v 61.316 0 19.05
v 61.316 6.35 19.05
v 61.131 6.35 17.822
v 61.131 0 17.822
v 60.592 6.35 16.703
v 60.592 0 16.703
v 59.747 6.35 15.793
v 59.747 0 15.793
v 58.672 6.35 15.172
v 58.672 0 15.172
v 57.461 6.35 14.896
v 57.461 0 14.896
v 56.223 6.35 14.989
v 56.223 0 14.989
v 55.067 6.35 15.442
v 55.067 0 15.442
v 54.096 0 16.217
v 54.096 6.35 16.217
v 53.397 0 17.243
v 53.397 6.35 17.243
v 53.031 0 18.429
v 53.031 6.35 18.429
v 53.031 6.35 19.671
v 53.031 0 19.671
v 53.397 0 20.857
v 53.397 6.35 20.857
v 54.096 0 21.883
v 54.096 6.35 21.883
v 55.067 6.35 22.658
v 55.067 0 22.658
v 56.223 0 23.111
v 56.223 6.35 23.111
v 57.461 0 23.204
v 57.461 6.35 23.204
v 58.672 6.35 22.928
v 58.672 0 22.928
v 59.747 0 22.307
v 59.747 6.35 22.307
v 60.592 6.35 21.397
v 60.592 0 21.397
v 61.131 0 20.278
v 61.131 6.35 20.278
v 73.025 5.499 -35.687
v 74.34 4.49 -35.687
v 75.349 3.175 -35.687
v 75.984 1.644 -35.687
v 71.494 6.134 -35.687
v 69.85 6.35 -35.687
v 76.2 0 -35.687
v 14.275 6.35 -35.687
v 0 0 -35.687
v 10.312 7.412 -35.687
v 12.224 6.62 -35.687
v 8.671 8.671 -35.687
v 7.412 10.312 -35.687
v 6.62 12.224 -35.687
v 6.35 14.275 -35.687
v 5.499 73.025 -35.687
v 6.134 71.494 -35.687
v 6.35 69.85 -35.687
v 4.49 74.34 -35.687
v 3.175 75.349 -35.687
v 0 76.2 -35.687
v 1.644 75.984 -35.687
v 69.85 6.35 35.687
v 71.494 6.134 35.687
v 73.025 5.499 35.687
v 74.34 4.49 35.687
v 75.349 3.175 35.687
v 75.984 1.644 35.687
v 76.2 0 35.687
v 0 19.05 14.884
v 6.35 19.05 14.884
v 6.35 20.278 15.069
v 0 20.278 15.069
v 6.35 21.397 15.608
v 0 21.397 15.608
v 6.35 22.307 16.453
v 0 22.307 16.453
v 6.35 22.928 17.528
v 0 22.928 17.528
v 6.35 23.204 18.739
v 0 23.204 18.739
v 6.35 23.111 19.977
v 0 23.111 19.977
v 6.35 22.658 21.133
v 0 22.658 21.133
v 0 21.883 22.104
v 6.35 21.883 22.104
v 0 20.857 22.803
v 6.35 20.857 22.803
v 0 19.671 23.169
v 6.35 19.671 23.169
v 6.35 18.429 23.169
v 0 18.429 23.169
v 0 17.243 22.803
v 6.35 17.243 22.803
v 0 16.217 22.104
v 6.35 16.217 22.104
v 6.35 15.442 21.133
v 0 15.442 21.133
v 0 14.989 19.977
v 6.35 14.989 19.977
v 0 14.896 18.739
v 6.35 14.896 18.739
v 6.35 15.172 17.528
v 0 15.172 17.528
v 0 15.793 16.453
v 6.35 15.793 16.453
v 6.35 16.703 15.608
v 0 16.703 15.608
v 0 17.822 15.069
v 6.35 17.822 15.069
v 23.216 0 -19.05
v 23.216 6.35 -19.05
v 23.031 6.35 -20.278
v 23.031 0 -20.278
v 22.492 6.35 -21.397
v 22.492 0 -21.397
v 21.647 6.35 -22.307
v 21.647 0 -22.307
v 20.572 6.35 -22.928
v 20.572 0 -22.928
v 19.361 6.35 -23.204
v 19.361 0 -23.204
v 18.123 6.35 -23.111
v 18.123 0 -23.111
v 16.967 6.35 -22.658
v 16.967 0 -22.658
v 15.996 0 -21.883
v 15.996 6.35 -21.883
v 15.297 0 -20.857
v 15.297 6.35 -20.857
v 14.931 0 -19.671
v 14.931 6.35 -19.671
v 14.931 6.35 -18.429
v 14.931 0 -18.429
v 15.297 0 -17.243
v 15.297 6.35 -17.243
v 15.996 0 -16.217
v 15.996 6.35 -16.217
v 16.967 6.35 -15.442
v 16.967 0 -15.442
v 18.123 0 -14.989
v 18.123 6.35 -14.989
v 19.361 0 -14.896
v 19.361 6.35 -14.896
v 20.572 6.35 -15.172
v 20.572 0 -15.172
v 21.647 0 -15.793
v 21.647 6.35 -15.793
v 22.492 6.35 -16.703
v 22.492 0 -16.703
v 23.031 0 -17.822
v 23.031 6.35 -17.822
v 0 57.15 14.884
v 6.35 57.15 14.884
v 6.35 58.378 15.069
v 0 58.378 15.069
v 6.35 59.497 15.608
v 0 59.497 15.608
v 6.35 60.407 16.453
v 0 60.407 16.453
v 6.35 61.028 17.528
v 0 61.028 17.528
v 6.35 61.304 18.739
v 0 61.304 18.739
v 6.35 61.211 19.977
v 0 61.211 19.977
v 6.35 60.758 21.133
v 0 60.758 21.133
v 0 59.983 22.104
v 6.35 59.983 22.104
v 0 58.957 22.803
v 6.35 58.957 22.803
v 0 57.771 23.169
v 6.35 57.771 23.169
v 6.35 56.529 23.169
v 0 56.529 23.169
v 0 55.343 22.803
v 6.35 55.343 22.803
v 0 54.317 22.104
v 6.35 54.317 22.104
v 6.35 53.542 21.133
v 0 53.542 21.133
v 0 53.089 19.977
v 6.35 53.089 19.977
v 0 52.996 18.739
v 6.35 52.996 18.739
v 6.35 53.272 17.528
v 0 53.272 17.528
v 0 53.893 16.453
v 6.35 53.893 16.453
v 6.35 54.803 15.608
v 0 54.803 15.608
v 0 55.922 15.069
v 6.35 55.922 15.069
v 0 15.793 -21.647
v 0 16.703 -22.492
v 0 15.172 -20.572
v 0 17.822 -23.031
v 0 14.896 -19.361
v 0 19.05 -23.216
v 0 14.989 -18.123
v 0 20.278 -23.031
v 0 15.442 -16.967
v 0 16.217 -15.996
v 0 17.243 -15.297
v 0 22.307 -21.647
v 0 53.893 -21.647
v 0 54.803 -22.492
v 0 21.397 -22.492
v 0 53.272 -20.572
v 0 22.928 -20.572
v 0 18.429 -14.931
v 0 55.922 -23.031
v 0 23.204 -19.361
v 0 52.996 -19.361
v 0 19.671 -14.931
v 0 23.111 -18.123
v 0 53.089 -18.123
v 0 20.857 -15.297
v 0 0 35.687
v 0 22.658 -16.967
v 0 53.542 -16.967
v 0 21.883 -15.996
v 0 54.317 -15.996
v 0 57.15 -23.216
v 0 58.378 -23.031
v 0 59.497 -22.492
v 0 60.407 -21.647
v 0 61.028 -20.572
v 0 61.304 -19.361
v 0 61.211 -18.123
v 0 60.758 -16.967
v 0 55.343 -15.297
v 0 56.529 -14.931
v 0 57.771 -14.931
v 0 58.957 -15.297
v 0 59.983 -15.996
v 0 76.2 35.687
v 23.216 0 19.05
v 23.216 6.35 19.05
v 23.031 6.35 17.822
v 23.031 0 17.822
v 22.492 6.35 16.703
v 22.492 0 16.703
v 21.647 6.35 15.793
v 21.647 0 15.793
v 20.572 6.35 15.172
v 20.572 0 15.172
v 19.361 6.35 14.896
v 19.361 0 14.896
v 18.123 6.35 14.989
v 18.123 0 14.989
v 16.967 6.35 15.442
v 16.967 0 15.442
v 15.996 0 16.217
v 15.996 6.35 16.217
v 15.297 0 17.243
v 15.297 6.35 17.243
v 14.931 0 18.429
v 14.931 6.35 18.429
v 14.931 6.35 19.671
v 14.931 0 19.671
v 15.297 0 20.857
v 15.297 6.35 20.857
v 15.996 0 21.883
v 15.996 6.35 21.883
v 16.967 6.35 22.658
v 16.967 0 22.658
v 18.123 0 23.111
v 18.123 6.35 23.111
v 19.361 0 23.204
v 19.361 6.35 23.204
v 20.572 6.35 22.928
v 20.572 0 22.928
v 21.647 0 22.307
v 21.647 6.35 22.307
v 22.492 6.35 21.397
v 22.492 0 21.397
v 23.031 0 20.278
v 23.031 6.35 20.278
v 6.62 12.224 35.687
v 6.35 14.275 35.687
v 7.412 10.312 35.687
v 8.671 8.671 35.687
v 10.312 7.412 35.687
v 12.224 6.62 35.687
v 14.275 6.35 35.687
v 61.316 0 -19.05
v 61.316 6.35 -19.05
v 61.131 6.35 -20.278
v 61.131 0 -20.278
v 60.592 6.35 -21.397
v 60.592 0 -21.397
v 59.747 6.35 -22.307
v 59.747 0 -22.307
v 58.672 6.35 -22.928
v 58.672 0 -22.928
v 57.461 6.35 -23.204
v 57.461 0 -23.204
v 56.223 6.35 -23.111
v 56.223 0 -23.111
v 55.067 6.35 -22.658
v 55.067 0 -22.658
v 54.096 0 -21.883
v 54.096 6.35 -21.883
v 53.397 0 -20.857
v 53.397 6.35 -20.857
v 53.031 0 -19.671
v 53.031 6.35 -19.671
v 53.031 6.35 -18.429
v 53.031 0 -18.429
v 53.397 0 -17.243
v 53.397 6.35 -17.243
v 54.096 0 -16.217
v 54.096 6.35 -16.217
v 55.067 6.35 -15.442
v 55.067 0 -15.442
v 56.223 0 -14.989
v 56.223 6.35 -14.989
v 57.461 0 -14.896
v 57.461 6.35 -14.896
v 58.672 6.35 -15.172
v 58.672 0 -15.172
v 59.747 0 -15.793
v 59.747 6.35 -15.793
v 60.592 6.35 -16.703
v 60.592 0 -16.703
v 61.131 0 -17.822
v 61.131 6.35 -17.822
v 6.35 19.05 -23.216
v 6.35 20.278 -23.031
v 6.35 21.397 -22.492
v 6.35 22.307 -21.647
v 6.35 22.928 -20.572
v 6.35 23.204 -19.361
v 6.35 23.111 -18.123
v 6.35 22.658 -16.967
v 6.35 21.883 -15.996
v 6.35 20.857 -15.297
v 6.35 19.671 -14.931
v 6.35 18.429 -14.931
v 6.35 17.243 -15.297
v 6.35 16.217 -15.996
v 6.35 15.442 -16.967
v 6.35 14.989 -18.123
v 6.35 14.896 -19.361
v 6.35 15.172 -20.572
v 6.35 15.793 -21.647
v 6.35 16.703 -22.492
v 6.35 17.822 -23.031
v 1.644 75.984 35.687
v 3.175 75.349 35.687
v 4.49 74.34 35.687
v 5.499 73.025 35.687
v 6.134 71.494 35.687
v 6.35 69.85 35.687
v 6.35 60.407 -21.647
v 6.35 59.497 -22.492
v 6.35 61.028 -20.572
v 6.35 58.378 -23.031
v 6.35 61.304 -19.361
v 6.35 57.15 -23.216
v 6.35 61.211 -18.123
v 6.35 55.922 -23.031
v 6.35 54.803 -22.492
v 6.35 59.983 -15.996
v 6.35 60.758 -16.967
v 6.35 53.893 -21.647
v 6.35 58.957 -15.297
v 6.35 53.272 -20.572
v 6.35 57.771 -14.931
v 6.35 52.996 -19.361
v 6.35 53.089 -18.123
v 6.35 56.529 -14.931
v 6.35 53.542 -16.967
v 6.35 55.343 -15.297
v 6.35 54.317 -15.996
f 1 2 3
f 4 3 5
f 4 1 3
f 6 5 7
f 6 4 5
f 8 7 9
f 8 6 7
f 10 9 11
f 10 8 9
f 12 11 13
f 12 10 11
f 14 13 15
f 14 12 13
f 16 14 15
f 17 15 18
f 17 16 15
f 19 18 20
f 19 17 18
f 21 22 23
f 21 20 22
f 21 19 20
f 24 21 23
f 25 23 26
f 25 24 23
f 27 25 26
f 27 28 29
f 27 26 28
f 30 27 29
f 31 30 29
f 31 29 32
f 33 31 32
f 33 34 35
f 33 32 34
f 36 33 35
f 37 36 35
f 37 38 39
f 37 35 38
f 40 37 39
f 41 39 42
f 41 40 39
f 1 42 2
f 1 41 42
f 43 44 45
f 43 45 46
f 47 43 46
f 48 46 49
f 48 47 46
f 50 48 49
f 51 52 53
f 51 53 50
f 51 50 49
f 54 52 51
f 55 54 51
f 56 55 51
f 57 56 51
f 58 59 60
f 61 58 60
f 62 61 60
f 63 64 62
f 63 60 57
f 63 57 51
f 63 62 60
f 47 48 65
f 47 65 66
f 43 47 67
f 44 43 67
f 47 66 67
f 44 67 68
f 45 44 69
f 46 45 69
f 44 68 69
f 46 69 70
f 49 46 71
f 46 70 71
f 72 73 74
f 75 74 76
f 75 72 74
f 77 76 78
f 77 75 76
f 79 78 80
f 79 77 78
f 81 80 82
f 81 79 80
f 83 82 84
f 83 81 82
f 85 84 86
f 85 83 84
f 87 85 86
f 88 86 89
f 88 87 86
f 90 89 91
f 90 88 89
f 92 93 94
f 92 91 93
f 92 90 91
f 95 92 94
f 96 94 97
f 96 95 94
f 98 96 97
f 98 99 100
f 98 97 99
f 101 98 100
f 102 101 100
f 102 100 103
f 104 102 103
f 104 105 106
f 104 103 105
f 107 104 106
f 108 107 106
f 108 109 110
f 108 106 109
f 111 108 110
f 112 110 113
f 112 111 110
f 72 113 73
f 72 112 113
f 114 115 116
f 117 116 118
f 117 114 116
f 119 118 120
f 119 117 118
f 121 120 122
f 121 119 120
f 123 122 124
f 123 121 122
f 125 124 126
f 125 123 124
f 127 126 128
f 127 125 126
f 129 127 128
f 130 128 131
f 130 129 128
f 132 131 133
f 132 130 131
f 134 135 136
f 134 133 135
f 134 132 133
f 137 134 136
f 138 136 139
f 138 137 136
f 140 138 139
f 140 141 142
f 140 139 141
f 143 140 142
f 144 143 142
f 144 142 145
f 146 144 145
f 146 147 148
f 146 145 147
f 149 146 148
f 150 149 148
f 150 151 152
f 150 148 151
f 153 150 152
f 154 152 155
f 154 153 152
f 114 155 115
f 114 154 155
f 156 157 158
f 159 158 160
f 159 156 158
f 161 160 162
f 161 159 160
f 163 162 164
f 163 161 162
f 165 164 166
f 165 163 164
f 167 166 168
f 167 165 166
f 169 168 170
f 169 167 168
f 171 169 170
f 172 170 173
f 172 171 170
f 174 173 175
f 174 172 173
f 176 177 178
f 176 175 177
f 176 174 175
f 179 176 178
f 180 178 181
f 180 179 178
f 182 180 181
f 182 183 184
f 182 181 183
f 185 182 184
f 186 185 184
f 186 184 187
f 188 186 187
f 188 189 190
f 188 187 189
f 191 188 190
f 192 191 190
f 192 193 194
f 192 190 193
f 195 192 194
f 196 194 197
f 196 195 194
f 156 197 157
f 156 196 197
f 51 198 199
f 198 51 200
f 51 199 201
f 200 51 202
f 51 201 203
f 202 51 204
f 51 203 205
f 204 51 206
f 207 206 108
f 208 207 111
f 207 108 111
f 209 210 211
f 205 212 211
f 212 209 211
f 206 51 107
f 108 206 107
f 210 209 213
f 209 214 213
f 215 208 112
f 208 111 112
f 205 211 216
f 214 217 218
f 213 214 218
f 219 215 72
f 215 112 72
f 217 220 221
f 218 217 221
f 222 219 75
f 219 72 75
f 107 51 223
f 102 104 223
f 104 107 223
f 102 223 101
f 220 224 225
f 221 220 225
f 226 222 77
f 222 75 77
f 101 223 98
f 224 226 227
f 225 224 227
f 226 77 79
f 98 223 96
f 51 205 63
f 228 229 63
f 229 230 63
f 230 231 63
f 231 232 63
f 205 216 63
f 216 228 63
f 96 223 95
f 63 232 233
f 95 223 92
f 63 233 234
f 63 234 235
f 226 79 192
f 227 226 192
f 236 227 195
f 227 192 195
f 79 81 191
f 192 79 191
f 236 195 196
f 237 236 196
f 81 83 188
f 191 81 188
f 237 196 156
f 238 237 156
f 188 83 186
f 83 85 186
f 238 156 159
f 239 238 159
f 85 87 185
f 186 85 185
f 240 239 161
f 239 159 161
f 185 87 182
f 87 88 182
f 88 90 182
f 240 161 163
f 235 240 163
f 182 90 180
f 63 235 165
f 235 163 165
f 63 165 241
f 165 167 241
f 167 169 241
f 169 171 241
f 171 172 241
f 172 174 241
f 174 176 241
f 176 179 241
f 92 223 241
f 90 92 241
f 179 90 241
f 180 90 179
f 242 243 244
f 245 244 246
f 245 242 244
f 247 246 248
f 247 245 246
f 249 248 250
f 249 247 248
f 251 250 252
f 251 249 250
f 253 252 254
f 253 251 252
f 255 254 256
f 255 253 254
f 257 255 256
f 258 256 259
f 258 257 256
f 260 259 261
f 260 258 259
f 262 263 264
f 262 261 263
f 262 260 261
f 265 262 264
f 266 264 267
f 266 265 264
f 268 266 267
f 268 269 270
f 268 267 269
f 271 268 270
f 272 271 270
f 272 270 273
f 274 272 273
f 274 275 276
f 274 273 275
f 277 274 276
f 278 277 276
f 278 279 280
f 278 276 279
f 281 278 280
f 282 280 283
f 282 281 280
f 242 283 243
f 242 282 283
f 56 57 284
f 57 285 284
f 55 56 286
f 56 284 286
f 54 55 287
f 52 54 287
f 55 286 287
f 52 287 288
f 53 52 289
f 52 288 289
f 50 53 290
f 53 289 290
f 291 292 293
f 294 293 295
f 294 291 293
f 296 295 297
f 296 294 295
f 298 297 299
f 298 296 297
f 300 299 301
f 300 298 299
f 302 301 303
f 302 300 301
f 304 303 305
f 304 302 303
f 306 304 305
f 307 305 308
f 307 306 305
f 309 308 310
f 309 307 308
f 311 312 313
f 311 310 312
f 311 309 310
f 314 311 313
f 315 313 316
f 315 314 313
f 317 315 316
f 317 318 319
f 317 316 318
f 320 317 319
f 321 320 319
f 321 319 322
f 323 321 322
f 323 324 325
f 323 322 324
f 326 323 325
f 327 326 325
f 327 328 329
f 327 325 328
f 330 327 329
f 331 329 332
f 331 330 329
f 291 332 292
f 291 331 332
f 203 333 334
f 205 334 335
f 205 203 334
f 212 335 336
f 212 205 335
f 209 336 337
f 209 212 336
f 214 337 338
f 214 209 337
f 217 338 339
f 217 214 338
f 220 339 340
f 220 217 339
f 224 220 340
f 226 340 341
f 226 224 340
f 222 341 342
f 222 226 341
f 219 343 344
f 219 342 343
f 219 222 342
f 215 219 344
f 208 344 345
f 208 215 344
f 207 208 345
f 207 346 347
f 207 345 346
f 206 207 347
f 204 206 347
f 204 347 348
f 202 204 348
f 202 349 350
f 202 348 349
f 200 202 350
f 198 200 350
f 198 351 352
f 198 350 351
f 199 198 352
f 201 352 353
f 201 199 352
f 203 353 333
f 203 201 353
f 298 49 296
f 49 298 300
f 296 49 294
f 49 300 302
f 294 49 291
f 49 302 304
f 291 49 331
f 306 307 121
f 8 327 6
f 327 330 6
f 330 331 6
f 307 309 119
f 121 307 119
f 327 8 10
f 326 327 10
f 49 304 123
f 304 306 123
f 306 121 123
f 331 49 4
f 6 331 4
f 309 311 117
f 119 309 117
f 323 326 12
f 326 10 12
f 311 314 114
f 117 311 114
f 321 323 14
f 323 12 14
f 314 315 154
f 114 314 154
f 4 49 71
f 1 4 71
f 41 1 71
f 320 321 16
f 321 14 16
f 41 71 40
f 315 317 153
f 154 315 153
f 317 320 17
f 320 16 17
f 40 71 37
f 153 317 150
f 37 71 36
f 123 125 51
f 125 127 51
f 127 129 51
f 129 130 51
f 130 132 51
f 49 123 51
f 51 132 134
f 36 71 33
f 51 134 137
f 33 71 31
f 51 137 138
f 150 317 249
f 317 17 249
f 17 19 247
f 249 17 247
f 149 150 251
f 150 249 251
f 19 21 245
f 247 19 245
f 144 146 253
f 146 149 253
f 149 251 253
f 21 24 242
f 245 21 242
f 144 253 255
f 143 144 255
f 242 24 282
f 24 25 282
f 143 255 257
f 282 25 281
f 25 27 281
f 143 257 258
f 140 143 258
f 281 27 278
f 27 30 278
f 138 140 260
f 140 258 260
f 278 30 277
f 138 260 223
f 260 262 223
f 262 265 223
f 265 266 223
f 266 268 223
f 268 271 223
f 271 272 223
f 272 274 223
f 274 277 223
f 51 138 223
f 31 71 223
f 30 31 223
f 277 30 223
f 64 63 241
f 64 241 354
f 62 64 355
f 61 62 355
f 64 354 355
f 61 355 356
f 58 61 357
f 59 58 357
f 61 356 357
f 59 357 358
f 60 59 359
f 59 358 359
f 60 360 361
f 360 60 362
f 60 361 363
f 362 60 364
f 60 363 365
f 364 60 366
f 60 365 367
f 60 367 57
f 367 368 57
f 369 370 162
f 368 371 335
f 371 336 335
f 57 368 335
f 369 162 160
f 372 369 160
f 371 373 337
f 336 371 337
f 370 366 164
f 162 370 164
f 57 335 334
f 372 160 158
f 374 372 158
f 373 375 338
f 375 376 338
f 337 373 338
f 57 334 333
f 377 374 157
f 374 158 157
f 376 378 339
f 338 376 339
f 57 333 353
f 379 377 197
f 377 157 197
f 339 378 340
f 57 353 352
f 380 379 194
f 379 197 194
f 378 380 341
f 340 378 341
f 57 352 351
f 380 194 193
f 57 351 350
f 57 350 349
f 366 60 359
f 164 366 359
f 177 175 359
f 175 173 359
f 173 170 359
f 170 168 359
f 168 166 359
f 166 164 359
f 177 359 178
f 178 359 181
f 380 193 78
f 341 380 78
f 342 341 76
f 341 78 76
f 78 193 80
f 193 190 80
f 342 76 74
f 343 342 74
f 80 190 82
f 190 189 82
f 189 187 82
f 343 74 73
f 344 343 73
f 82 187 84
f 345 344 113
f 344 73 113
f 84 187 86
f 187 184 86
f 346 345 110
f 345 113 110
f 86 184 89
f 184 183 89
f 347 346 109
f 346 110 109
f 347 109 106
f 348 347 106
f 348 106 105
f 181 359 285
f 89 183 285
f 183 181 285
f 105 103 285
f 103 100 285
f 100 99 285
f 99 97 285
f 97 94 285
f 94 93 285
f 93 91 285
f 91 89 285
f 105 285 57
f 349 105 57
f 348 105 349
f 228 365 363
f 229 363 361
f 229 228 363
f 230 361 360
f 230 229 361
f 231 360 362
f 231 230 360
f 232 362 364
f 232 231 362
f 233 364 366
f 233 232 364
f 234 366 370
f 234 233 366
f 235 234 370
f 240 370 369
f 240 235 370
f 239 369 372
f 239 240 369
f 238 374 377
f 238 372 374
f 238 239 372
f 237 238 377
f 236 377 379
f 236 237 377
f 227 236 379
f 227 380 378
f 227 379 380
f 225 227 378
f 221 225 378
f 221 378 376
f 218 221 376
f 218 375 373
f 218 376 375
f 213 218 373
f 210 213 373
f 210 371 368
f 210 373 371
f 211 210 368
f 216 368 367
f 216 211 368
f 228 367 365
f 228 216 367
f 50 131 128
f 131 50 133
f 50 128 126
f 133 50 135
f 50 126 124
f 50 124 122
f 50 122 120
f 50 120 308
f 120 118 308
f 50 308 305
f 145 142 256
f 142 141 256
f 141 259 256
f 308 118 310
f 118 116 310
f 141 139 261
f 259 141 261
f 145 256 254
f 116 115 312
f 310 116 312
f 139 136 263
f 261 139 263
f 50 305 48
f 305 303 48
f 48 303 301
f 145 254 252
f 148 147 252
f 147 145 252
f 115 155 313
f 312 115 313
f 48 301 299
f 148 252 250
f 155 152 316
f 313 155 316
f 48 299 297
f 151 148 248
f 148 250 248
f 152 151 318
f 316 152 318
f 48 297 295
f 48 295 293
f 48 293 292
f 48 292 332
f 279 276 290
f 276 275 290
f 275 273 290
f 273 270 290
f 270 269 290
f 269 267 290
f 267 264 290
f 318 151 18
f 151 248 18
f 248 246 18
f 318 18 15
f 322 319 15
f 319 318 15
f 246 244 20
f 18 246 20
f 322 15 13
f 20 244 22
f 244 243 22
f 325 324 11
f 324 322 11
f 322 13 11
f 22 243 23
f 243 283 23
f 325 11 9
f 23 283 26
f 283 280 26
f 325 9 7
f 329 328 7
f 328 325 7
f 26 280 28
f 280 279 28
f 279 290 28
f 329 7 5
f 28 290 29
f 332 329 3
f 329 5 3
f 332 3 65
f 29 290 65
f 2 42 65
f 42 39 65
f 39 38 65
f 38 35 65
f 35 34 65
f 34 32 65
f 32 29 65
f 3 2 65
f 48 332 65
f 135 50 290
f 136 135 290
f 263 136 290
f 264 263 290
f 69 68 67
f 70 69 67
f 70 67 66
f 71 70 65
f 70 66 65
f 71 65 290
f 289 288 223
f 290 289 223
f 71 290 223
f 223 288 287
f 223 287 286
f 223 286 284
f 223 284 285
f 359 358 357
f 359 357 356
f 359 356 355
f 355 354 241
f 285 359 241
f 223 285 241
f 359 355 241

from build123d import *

# Parameters (mm, degrees)
BOSS_EXTRUDE1_DEPTH = 35.687
SKETCH2_R           = 4.1656
CUT_EXTRUDE1_DEPTH  = 77.2
SKETCH3_R           = 4.1656
CUT_EXTRUDE2_DEPTH  = 77.2


with BuildPart() as part:
    # Sketch1 → Boss-Extrude1 (new body, symmetric)
    with BuildSketch(Plane.XY):
        with BuildLine():
            Line((0, 0), (0, 76.2))
            ThreePointArc((0, 76.2), (4.490128061, 74.340128061), (6.35, 69.85))
            Line((6.35, 69.85), (6.35, 14.2748))
            ThreePointArc((6.35, 14.2748), (8.67112018, 8.67112018), (14.2748, 6.35))
            Line((14.2748, 6.35), (69.85, 6.35))
            ThreePointArc((69.85, 6.35), (74.340128061, 4.490128061), (76.2, 0))
            Line((76.2, 0), (0, 0))
        make_face()
    extrude(amount=BOSS_EXTRUDE1_DEPTH, both=True)

    # Sketch2 → Cut-Extrude1 (cut, through all)
    with BuildSketch(Plane(origin=(0, 0, 0), x_dir=(1, 0, 0), z_dir=(0, 1, 0))):
        with Locations((19.05, -19.05)):
            Circle(SKETCH2_R)
        with Locations((57.15, -19.05)):
            Circle(SKETCH2_R)
        with Locations((19.05, 19.05)):
            Circle(SKETCH2_R)
        with Locations((57.15, 19.05)):
            Circle(SKETCH2_R)
    extrude(amount=CUT_EXTRUDE1_DEPTH, mode=Mode.SUBTRACT)

    # Sketch3 → Cut-Extrude2 (cut, through all)
    with BuildSketch(Plane(origin=(0, 0, 0), x_dir=(0, 0, -1), z_dir=(1, 0, 0))):
        with Locations((-19.05, 19.05)):
            Circle(SKETCH3_R)
        with Locations((-19.05, 57.15)):
            Circle(SKETCH3_R)
        with Locations((19.05, 19.05)):
            Circle(SKETCH3_R)
        with Locations((19.05, 57.15)):
            Circle(SKETCH3_R)
    extrude(amount=CUT_EXTRUDE2_DEPTH, mode=Mode.SUBTRACT)


solid = part.part
